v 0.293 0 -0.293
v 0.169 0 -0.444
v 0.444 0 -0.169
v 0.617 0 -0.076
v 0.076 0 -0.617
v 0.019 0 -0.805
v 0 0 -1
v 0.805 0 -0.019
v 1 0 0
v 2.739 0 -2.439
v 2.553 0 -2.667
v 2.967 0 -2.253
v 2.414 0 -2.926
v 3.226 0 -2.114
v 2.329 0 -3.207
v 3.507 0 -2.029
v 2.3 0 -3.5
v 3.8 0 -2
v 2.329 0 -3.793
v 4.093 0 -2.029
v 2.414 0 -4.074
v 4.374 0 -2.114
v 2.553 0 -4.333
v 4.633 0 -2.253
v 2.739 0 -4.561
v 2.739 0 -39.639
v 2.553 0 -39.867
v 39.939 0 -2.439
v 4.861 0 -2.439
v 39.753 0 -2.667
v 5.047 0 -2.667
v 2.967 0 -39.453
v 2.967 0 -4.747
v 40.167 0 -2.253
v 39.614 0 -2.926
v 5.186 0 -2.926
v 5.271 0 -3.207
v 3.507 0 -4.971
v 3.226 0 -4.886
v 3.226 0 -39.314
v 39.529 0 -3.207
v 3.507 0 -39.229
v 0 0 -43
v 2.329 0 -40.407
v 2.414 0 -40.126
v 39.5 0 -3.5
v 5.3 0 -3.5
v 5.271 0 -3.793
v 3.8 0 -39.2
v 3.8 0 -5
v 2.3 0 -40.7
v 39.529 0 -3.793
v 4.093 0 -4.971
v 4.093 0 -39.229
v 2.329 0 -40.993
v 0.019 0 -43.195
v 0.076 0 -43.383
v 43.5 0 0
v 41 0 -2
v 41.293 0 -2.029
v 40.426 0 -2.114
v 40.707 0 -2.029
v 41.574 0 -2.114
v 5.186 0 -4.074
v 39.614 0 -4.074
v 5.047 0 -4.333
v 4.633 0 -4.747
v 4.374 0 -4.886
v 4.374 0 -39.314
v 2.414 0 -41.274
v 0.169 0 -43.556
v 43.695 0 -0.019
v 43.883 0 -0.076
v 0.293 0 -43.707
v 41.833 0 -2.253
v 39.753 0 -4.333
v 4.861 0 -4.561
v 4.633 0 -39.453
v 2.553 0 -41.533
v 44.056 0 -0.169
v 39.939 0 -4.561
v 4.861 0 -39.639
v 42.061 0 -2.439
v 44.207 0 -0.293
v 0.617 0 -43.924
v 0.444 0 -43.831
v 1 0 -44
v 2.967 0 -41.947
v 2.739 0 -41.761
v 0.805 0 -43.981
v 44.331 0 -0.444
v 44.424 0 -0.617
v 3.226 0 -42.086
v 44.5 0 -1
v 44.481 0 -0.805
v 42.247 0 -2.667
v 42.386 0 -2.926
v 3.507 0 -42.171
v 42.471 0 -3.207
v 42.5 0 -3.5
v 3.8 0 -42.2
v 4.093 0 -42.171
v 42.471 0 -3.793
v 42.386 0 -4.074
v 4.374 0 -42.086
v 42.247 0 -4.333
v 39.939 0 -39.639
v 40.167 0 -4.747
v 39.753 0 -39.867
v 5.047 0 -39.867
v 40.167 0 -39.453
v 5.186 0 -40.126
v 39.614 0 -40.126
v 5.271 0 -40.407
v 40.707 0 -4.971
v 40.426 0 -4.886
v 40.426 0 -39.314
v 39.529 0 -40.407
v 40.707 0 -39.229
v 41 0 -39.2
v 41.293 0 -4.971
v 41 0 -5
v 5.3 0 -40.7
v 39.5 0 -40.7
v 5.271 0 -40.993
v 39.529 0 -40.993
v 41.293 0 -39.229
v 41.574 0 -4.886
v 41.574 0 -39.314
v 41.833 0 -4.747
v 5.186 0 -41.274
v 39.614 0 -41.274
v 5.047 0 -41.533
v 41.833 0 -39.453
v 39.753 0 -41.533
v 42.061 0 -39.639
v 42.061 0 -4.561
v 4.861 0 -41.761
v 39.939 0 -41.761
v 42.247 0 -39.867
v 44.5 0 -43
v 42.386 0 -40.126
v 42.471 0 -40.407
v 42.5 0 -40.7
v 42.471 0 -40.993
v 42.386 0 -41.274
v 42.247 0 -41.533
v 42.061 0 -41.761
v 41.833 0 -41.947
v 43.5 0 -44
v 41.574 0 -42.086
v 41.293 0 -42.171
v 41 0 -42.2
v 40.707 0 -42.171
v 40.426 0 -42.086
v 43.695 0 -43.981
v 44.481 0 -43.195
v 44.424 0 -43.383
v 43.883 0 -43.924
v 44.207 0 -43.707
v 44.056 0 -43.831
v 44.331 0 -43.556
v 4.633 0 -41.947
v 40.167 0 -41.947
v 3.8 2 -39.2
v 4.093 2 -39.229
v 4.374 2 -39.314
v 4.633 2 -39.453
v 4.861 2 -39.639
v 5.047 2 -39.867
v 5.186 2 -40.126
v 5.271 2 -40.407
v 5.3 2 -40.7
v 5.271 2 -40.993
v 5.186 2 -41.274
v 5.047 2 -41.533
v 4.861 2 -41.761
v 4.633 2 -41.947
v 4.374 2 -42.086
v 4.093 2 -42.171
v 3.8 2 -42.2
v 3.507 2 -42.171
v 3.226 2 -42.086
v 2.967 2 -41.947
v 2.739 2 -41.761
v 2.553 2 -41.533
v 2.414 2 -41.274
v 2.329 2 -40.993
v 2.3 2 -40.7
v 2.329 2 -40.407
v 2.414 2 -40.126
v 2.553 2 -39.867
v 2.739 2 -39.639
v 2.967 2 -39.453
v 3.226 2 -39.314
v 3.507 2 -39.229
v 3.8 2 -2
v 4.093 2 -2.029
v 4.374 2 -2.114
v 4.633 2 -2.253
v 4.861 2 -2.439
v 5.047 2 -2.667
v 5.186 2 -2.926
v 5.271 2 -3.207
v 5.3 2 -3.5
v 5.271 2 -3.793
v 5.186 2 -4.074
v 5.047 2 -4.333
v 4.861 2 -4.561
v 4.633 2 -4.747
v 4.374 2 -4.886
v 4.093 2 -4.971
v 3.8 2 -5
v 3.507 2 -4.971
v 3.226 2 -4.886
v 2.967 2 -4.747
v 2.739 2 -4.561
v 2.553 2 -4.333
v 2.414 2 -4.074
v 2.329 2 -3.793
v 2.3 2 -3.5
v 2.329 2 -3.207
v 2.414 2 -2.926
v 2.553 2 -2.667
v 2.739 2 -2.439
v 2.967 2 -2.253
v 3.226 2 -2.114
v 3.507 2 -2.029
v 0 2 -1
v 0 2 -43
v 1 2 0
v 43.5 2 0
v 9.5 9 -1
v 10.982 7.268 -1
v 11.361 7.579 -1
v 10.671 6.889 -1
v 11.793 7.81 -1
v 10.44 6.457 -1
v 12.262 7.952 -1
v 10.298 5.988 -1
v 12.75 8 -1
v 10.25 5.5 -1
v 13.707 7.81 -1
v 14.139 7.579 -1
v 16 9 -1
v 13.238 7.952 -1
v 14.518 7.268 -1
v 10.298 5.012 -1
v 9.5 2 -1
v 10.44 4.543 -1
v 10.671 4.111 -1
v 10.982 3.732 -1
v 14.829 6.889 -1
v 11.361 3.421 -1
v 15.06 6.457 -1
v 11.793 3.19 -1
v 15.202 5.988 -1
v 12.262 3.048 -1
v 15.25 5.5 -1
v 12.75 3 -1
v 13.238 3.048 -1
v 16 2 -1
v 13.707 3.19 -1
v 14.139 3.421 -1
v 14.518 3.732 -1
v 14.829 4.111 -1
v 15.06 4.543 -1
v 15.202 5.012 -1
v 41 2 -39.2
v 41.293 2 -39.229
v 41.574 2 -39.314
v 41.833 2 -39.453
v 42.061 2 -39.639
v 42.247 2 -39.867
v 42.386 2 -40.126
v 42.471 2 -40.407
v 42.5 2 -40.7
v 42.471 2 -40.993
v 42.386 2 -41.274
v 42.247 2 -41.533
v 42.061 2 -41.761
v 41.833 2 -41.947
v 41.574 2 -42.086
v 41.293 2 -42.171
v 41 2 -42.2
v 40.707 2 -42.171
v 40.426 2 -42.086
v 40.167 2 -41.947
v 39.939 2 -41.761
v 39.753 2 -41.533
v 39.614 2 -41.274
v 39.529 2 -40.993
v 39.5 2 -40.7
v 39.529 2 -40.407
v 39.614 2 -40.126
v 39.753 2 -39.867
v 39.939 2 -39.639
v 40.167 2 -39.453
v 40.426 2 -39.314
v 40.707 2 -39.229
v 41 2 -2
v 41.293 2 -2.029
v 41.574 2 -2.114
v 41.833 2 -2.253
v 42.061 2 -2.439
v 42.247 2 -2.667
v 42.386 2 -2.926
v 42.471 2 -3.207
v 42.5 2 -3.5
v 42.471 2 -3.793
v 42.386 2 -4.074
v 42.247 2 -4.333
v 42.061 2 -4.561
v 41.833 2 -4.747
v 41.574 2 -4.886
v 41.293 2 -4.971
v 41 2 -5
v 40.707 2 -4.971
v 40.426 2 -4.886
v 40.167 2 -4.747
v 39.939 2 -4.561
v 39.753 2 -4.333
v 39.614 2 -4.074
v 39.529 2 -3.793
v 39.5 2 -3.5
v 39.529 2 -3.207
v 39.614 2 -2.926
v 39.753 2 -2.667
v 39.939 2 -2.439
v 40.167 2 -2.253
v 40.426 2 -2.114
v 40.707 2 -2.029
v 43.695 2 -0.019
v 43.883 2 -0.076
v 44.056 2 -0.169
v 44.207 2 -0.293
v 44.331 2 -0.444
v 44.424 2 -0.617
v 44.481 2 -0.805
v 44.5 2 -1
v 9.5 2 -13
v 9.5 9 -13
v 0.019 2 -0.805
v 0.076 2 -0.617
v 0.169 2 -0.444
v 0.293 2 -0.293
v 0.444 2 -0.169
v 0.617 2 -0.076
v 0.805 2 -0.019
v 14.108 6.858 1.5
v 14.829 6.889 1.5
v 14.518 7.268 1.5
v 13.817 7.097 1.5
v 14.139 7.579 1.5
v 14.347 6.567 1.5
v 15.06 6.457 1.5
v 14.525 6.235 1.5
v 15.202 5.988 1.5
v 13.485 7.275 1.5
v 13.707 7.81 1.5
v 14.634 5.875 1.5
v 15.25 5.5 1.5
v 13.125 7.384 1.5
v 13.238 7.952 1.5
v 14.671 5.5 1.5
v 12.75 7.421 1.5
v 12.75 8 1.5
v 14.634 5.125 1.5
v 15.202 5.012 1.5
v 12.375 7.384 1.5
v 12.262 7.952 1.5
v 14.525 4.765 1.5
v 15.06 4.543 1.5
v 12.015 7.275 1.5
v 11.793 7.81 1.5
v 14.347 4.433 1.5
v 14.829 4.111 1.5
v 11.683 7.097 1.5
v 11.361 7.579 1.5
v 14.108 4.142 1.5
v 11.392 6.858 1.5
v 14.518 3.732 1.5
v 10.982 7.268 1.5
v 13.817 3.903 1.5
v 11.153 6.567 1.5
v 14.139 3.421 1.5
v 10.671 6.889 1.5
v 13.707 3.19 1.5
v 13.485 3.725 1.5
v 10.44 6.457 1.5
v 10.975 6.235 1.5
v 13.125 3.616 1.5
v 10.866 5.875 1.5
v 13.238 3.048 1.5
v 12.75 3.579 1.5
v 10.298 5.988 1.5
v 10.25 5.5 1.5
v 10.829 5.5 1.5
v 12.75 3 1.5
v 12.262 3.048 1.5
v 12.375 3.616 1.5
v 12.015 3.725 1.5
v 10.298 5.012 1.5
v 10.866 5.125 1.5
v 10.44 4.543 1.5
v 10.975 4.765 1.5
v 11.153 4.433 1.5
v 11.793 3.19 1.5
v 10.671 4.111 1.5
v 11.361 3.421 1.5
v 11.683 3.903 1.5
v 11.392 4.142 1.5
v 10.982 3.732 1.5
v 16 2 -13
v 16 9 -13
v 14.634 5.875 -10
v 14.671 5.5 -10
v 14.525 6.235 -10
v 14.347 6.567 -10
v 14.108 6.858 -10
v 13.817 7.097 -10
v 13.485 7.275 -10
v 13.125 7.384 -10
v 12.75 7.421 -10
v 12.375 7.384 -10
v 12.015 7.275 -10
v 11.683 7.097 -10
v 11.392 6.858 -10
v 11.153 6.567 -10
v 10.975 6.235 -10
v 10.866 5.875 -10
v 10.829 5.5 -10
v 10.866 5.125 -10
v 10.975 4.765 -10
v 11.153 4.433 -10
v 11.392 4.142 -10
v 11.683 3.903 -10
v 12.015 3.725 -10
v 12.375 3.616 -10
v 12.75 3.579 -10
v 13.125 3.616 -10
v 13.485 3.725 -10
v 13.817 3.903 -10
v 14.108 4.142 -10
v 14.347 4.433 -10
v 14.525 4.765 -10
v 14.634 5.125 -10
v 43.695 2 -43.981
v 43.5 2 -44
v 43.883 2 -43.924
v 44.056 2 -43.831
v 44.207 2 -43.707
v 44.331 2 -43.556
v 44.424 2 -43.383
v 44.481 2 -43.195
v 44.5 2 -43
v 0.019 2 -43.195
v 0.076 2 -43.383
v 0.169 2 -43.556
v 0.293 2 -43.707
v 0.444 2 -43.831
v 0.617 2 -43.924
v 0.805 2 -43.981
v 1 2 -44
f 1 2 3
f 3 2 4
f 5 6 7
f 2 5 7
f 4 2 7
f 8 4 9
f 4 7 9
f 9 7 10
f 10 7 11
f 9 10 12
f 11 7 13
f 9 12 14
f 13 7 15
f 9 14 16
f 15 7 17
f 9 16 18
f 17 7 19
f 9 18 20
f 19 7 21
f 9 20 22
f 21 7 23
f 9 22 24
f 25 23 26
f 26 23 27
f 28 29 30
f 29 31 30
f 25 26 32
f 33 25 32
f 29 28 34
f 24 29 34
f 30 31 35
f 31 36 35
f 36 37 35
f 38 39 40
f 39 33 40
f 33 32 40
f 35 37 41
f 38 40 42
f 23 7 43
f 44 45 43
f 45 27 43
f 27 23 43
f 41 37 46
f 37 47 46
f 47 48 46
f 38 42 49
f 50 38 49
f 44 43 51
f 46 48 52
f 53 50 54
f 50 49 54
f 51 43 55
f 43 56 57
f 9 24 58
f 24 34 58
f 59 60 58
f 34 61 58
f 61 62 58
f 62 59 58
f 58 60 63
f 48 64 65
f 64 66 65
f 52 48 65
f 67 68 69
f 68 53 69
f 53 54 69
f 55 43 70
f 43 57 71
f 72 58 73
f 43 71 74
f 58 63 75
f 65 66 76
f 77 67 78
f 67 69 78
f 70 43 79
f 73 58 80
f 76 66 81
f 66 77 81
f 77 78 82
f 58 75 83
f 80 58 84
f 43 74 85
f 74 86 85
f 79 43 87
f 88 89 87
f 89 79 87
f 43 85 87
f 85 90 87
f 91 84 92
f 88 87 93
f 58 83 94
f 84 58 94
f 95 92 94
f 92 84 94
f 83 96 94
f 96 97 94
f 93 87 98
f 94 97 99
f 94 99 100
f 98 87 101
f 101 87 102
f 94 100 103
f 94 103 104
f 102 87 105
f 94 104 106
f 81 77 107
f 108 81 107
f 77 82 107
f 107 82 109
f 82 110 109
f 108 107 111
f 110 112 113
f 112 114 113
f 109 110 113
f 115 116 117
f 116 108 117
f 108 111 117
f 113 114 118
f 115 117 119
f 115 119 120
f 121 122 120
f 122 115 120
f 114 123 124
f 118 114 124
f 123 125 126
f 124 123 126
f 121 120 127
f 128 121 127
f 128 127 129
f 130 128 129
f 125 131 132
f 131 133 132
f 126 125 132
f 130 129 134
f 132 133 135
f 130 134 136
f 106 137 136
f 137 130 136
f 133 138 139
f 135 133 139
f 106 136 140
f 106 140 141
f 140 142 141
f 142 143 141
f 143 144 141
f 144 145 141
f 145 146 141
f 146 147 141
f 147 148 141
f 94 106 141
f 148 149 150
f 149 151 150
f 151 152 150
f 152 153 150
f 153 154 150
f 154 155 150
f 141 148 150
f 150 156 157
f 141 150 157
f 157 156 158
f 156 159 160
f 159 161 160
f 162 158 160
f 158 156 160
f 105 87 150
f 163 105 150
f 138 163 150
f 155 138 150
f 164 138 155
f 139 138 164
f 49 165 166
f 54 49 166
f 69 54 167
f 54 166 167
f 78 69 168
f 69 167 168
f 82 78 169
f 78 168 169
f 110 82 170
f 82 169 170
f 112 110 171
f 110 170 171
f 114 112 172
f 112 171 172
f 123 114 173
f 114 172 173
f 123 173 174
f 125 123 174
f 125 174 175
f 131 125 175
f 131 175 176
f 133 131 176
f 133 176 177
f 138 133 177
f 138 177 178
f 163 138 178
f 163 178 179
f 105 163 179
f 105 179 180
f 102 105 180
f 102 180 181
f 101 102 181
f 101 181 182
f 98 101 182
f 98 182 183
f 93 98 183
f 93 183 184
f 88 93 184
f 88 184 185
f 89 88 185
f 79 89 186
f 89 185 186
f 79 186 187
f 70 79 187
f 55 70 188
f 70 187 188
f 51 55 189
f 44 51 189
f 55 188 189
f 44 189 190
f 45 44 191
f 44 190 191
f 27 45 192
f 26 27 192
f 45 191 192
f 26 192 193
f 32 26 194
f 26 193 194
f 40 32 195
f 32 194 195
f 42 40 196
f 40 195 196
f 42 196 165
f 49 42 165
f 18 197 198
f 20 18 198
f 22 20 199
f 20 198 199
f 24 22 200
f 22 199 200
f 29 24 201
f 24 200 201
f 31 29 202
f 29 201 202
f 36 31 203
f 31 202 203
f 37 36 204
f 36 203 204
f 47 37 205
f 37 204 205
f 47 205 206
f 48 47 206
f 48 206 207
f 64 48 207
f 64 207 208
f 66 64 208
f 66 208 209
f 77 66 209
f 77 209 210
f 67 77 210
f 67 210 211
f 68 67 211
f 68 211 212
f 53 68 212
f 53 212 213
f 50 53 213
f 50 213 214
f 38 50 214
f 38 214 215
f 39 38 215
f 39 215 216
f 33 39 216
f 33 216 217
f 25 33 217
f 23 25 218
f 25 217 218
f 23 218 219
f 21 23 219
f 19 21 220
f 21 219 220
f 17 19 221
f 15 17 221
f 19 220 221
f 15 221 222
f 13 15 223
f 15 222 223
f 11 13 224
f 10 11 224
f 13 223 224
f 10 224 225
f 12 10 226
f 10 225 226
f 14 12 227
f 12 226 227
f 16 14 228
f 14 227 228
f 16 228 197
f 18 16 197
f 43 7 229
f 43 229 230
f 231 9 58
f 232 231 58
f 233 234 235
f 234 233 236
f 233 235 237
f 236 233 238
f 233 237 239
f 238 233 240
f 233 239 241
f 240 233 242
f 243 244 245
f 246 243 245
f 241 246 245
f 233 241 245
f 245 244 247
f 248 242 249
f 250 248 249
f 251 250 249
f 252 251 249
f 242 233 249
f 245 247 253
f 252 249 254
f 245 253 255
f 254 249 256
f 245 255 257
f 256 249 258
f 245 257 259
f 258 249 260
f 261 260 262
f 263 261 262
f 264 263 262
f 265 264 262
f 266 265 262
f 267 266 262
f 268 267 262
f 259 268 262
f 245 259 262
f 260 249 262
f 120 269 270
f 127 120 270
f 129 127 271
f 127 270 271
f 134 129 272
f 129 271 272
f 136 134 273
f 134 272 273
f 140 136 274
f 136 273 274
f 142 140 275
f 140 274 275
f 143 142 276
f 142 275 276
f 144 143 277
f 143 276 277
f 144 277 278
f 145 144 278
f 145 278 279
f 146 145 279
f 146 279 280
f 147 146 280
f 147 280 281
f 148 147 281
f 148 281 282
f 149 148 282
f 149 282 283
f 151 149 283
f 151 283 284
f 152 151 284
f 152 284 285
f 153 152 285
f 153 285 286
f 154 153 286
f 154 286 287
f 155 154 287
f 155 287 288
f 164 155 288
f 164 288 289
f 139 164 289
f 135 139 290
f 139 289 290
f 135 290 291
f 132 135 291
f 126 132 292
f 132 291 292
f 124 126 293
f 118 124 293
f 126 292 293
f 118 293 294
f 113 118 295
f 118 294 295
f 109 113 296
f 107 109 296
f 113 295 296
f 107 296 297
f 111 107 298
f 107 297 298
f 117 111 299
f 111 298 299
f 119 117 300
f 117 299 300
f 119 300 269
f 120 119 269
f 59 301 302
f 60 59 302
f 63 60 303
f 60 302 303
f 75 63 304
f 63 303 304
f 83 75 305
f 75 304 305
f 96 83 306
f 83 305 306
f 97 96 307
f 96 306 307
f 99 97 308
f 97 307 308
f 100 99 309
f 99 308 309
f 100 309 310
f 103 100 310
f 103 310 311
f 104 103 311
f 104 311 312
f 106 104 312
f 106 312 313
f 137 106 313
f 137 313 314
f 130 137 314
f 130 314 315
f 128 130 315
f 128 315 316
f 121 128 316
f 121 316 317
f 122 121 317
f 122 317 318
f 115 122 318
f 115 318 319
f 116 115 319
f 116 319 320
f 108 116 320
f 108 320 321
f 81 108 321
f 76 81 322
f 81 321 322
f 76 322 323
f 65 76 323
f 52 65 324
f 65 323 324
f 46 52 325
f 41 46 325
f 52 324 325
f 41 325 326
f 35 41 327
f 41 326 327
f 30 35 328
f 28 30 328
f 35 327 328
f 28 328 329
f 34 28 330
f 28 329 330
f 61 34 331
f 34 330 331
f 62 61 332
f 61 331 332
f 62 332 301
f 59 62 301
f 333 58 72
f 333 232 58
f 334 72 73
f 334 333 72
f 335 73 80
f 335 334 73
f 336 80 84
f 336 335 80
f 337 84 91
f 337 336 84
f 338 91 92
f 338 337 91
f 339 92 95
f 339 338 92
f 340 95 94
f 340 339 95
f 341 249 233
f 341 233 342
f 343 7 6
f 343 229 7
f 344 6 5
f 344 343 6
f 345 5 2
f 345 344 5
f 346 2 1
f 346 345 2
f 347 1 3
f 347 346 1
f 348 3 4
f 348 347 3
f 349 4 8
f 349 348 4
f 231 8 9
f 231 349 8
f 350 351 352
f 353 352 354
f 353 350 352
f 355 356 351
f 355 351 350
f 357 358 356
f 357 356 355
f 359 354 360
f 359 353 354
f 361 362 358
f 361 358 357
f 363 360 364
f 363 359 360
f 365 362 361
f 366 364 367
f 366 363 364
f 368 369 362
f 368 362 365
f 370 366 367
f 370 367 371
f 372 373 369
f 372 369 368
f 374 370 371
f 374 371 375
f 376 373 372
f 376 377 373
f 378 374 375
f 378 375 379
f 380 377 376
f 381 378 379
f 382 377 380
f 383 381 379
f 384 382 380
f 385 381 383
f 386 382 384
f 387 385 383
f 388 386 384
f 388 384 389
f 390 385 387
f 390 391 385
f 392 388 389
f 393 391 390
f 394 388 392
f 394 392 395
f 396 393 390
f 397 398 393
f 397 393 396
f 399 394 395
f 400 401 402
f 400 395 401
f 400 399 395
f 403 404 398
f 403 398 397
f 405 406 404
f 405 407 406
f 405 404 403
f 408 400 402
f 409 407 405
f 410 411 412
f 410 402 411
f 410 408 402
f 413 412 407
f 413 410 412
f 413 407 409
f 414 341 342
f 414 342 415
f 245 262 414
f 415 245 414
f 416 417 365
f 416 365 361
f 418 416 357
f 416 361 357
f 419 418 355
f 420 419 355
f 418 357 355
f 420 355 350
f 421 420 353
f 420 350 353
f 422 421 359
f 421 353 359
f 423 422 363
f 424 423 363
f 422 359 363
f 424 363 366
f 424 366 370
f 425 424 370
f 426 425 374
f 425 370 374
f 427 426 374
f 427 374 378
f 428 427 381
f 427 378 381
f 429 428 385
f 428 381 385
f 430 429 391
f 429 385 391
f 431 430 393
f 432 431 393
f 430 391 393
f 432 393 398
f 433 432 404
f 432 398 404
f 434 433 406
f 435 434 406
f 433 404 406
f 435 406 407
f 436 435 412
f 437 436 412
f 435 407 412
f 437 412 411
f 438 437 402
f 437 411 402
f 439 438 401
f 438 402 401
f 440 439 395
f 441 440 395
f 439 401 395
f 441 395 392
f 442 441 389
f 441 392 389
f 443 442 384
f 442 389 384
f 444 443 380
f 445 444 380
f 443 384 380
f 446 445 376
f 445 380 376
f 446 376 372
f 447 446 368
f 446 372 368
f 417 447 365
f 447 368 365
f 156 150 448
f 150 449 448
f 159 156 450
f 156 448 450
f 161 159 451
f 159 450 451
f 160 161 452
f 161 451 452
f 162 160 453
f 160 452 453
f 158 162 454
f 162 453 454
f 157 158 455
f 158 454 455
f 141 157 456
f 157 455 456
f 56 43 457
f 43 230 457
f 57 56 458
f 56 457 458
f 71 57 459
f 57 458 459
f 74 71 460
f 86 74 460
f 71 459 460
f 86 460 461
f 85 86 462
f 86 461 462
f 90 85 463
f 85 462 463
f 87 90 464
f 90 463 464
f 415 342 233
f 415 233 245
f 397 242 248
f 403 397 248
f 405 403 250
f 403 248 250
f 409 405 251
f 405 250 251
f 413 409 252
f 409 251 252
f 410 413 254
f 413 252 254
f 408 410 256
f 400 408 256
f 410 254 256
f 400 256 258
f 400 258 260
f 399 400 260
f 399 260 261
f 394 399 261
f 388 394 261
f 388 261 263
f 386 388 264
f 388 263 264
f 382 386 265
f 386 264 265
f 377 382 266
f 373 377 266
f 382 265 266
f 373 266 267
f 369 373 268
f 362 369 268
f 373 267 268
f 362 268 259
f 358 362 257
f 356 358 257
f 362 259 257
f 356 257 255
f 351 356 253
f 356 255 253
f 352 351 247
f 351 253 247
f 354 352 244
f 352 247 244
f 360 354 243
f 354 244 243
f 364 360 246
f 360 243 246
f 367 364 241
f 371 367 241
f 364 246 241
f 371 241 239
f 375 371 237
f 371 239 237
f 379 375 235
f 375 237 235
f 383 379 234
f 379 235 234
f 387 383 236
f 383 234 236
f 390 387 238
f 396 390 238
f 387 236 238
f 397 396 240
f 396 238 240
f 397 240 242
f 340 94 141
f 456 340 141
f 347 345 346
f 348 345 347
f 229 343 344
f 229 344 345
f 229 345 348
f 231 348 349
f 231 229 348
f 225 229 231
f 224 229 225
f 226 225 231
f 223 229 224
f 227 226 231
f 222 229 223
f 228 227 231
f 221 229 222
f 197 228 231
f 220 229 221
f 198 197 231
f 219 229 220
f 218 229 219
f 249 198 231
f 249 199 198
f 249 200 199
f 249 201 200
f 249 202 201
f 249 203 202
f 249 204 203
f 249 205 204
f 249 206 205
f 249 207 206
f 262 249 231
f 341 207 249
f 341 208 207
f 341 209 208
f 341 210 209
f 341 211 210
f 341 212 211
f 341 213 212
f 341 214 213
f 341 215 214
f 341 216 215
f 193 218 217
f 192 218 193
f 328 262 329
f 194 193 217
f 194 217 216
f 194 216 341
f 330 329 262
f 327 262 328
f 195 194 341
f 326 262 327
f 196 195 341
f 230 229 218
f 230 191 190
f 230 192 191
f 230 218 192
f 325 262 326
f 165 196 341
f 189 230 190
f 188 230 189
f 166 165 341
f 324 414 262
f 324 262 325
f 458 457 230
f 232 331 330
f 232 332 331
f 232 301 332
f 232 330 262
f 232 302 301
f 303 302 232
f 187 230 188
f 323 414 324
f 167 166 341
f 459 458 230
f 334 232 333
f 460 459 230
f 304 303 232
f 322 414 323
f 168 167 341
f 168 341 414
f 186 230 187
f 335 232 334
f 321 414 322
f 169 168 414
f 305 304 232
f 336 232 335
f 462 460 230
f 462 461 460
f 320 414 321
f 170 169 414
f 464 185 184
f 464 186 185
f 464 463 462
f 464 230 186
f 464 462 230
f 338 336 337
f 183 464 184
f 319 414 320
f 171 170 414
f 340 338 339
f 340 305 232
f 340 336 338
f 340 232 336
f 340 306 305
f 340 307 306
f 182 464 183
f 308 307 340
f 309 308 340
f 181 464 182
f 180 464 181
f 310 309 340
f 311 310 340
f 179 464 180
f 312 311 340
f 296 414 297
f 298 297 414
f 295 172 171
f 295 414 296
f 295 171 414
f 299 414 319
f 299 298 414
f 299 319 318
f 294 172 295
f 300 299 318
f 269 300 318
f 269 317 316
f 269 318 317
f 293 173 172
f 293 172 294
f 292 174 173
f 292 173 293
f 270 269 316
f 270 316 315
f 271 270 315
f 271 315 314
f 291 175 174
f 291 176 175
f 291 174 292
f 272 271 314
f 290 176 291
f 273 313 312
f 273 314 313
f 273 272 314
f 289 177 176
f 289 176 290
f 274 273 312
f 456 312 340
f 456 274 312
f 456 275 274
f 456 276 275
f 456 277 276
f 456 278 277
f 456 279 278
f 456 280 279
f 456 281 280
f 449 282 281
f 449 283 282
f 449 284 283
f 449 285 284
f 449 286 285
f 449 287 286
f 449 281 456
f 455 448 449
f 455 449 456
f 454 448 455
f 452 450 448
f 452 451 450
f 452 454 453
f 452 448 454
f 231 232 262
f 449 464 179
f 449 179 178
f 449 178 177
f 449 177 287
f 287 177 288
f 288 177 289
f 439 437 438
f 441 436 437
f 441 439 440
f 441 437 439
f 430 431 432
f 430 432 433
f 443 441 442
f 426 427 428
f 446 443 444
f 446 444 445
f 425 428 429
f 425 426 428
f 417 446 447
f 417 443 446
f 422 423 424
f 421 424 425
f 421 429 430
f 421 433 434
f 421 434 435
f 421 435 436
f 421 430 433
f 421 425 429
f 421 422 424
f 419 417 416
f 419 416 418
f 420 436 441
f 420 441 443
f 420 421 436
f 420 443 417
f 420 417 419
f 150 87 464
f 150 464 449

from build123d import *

# Parameters (mm, degrees)
SKETCH1_W           = 44.5
SKETCH1_H           = 44
BOSS_EXTRUDE1_DEPTH = 2
SKETCH2_R           = 1.5
CUT_EXTRUDE1_DEPTH  = 63.611899827
SKETCH3_W           = 6.5
SKETCH3_H           = 12
BOSS_EXTRUDE2_DEPTH = 7
SKETCH4_R           = 2.5
BOSS_EXTRUDE3_DEPTH = 2.5
SKETCH5_R           = 1.920961375
CUT_EXTRUDE2_DEPTH  = 11.5
FILLET1_R           = 1


with BuildPart() as part:
    # Sketch1 → Boss-Extrude1 (new body)
    with BuildSketch(Plane(origin=(0, 0, 0), x_dir=(1, 0, 0), z_dir=(0, 1, 0))):
        with Locations((22.25, 22)):
            Rectangle(SKETCH1_W, SKETCH1_H)
    extrude(amount=BOSS_EXTRUDE1_DEPTH)

    # Sketch2 → Cut-Extrude1 (cut, through all)
    with BuildSketch(Plane(origin=(0, 2, 0), x_dir=(1, 0, 0), z_dir=(0, 1, 0))):
        with Locations(Location((3.8, 40.7, 0), (0, 0, 270))):
            Circle(SKETCH2_R)
        with Locations(Location((3.8, 3.5, 0), (0, 0, 270))):
            Circle(SKETCH2_R)
        with Locations(Location((41, 3.5, 0), (0, 0, 270))):
            Circle(SKETCH2_R)
        with Locations(Location((41, 40.7, 0), (0, 0, 270))):
            Circle(SKETCH2_R)
    extrude(amount=-CUT_EXTRUDE1_DEPTH, mode=Mode.SUBTRACT)

    # Sketch3 → Boss-Extrude2 (add)
    with BuildSketch(Plane(origin=(0, 2, 0), x_dir=(1, 0, 0), z_dir=(0, 1, 0))):
        with Locations((12.75, 7)):
            Rectangle(SKETCH3_W, SKETCH3_H)
    extrude(amount=BOSS_EXTRUDE2_DEPTH)

    # Sketch4 → Boss-Extrude3 (add)
    with BuildSketch(Plane.XY.offset(-1)):
        with Locations(Location((12.75, 5.5, 0), (0, 0, 180))):
            Circle(SKETCH4_R)
    extrude(amount=BOSS_EXTRUDE3_DEPTH)

    # Sketch5 → Cut-Extrude2 (cut)
    with BuildSketch(Plane.XY.offset(1.5)):
        with Locations((12.75, 5.5)):
            Circle(SKETCH5_R)
    extrude(amount=-CUT_EXTRUDE2_DEPTH, mode=Mode.SUBTRACT)

    # Fillet1
    fillet1_edges = [part.edges().sort_by_distance(p)[0] for p in [
        (0, 1, -44),
        (44.5, 1, -44),
        (44.5, 1, 0),
        (0, 1, 0),
    ]]
    fillet(fillet1_edges, radius=FILLET1_R)


solid = part.part
